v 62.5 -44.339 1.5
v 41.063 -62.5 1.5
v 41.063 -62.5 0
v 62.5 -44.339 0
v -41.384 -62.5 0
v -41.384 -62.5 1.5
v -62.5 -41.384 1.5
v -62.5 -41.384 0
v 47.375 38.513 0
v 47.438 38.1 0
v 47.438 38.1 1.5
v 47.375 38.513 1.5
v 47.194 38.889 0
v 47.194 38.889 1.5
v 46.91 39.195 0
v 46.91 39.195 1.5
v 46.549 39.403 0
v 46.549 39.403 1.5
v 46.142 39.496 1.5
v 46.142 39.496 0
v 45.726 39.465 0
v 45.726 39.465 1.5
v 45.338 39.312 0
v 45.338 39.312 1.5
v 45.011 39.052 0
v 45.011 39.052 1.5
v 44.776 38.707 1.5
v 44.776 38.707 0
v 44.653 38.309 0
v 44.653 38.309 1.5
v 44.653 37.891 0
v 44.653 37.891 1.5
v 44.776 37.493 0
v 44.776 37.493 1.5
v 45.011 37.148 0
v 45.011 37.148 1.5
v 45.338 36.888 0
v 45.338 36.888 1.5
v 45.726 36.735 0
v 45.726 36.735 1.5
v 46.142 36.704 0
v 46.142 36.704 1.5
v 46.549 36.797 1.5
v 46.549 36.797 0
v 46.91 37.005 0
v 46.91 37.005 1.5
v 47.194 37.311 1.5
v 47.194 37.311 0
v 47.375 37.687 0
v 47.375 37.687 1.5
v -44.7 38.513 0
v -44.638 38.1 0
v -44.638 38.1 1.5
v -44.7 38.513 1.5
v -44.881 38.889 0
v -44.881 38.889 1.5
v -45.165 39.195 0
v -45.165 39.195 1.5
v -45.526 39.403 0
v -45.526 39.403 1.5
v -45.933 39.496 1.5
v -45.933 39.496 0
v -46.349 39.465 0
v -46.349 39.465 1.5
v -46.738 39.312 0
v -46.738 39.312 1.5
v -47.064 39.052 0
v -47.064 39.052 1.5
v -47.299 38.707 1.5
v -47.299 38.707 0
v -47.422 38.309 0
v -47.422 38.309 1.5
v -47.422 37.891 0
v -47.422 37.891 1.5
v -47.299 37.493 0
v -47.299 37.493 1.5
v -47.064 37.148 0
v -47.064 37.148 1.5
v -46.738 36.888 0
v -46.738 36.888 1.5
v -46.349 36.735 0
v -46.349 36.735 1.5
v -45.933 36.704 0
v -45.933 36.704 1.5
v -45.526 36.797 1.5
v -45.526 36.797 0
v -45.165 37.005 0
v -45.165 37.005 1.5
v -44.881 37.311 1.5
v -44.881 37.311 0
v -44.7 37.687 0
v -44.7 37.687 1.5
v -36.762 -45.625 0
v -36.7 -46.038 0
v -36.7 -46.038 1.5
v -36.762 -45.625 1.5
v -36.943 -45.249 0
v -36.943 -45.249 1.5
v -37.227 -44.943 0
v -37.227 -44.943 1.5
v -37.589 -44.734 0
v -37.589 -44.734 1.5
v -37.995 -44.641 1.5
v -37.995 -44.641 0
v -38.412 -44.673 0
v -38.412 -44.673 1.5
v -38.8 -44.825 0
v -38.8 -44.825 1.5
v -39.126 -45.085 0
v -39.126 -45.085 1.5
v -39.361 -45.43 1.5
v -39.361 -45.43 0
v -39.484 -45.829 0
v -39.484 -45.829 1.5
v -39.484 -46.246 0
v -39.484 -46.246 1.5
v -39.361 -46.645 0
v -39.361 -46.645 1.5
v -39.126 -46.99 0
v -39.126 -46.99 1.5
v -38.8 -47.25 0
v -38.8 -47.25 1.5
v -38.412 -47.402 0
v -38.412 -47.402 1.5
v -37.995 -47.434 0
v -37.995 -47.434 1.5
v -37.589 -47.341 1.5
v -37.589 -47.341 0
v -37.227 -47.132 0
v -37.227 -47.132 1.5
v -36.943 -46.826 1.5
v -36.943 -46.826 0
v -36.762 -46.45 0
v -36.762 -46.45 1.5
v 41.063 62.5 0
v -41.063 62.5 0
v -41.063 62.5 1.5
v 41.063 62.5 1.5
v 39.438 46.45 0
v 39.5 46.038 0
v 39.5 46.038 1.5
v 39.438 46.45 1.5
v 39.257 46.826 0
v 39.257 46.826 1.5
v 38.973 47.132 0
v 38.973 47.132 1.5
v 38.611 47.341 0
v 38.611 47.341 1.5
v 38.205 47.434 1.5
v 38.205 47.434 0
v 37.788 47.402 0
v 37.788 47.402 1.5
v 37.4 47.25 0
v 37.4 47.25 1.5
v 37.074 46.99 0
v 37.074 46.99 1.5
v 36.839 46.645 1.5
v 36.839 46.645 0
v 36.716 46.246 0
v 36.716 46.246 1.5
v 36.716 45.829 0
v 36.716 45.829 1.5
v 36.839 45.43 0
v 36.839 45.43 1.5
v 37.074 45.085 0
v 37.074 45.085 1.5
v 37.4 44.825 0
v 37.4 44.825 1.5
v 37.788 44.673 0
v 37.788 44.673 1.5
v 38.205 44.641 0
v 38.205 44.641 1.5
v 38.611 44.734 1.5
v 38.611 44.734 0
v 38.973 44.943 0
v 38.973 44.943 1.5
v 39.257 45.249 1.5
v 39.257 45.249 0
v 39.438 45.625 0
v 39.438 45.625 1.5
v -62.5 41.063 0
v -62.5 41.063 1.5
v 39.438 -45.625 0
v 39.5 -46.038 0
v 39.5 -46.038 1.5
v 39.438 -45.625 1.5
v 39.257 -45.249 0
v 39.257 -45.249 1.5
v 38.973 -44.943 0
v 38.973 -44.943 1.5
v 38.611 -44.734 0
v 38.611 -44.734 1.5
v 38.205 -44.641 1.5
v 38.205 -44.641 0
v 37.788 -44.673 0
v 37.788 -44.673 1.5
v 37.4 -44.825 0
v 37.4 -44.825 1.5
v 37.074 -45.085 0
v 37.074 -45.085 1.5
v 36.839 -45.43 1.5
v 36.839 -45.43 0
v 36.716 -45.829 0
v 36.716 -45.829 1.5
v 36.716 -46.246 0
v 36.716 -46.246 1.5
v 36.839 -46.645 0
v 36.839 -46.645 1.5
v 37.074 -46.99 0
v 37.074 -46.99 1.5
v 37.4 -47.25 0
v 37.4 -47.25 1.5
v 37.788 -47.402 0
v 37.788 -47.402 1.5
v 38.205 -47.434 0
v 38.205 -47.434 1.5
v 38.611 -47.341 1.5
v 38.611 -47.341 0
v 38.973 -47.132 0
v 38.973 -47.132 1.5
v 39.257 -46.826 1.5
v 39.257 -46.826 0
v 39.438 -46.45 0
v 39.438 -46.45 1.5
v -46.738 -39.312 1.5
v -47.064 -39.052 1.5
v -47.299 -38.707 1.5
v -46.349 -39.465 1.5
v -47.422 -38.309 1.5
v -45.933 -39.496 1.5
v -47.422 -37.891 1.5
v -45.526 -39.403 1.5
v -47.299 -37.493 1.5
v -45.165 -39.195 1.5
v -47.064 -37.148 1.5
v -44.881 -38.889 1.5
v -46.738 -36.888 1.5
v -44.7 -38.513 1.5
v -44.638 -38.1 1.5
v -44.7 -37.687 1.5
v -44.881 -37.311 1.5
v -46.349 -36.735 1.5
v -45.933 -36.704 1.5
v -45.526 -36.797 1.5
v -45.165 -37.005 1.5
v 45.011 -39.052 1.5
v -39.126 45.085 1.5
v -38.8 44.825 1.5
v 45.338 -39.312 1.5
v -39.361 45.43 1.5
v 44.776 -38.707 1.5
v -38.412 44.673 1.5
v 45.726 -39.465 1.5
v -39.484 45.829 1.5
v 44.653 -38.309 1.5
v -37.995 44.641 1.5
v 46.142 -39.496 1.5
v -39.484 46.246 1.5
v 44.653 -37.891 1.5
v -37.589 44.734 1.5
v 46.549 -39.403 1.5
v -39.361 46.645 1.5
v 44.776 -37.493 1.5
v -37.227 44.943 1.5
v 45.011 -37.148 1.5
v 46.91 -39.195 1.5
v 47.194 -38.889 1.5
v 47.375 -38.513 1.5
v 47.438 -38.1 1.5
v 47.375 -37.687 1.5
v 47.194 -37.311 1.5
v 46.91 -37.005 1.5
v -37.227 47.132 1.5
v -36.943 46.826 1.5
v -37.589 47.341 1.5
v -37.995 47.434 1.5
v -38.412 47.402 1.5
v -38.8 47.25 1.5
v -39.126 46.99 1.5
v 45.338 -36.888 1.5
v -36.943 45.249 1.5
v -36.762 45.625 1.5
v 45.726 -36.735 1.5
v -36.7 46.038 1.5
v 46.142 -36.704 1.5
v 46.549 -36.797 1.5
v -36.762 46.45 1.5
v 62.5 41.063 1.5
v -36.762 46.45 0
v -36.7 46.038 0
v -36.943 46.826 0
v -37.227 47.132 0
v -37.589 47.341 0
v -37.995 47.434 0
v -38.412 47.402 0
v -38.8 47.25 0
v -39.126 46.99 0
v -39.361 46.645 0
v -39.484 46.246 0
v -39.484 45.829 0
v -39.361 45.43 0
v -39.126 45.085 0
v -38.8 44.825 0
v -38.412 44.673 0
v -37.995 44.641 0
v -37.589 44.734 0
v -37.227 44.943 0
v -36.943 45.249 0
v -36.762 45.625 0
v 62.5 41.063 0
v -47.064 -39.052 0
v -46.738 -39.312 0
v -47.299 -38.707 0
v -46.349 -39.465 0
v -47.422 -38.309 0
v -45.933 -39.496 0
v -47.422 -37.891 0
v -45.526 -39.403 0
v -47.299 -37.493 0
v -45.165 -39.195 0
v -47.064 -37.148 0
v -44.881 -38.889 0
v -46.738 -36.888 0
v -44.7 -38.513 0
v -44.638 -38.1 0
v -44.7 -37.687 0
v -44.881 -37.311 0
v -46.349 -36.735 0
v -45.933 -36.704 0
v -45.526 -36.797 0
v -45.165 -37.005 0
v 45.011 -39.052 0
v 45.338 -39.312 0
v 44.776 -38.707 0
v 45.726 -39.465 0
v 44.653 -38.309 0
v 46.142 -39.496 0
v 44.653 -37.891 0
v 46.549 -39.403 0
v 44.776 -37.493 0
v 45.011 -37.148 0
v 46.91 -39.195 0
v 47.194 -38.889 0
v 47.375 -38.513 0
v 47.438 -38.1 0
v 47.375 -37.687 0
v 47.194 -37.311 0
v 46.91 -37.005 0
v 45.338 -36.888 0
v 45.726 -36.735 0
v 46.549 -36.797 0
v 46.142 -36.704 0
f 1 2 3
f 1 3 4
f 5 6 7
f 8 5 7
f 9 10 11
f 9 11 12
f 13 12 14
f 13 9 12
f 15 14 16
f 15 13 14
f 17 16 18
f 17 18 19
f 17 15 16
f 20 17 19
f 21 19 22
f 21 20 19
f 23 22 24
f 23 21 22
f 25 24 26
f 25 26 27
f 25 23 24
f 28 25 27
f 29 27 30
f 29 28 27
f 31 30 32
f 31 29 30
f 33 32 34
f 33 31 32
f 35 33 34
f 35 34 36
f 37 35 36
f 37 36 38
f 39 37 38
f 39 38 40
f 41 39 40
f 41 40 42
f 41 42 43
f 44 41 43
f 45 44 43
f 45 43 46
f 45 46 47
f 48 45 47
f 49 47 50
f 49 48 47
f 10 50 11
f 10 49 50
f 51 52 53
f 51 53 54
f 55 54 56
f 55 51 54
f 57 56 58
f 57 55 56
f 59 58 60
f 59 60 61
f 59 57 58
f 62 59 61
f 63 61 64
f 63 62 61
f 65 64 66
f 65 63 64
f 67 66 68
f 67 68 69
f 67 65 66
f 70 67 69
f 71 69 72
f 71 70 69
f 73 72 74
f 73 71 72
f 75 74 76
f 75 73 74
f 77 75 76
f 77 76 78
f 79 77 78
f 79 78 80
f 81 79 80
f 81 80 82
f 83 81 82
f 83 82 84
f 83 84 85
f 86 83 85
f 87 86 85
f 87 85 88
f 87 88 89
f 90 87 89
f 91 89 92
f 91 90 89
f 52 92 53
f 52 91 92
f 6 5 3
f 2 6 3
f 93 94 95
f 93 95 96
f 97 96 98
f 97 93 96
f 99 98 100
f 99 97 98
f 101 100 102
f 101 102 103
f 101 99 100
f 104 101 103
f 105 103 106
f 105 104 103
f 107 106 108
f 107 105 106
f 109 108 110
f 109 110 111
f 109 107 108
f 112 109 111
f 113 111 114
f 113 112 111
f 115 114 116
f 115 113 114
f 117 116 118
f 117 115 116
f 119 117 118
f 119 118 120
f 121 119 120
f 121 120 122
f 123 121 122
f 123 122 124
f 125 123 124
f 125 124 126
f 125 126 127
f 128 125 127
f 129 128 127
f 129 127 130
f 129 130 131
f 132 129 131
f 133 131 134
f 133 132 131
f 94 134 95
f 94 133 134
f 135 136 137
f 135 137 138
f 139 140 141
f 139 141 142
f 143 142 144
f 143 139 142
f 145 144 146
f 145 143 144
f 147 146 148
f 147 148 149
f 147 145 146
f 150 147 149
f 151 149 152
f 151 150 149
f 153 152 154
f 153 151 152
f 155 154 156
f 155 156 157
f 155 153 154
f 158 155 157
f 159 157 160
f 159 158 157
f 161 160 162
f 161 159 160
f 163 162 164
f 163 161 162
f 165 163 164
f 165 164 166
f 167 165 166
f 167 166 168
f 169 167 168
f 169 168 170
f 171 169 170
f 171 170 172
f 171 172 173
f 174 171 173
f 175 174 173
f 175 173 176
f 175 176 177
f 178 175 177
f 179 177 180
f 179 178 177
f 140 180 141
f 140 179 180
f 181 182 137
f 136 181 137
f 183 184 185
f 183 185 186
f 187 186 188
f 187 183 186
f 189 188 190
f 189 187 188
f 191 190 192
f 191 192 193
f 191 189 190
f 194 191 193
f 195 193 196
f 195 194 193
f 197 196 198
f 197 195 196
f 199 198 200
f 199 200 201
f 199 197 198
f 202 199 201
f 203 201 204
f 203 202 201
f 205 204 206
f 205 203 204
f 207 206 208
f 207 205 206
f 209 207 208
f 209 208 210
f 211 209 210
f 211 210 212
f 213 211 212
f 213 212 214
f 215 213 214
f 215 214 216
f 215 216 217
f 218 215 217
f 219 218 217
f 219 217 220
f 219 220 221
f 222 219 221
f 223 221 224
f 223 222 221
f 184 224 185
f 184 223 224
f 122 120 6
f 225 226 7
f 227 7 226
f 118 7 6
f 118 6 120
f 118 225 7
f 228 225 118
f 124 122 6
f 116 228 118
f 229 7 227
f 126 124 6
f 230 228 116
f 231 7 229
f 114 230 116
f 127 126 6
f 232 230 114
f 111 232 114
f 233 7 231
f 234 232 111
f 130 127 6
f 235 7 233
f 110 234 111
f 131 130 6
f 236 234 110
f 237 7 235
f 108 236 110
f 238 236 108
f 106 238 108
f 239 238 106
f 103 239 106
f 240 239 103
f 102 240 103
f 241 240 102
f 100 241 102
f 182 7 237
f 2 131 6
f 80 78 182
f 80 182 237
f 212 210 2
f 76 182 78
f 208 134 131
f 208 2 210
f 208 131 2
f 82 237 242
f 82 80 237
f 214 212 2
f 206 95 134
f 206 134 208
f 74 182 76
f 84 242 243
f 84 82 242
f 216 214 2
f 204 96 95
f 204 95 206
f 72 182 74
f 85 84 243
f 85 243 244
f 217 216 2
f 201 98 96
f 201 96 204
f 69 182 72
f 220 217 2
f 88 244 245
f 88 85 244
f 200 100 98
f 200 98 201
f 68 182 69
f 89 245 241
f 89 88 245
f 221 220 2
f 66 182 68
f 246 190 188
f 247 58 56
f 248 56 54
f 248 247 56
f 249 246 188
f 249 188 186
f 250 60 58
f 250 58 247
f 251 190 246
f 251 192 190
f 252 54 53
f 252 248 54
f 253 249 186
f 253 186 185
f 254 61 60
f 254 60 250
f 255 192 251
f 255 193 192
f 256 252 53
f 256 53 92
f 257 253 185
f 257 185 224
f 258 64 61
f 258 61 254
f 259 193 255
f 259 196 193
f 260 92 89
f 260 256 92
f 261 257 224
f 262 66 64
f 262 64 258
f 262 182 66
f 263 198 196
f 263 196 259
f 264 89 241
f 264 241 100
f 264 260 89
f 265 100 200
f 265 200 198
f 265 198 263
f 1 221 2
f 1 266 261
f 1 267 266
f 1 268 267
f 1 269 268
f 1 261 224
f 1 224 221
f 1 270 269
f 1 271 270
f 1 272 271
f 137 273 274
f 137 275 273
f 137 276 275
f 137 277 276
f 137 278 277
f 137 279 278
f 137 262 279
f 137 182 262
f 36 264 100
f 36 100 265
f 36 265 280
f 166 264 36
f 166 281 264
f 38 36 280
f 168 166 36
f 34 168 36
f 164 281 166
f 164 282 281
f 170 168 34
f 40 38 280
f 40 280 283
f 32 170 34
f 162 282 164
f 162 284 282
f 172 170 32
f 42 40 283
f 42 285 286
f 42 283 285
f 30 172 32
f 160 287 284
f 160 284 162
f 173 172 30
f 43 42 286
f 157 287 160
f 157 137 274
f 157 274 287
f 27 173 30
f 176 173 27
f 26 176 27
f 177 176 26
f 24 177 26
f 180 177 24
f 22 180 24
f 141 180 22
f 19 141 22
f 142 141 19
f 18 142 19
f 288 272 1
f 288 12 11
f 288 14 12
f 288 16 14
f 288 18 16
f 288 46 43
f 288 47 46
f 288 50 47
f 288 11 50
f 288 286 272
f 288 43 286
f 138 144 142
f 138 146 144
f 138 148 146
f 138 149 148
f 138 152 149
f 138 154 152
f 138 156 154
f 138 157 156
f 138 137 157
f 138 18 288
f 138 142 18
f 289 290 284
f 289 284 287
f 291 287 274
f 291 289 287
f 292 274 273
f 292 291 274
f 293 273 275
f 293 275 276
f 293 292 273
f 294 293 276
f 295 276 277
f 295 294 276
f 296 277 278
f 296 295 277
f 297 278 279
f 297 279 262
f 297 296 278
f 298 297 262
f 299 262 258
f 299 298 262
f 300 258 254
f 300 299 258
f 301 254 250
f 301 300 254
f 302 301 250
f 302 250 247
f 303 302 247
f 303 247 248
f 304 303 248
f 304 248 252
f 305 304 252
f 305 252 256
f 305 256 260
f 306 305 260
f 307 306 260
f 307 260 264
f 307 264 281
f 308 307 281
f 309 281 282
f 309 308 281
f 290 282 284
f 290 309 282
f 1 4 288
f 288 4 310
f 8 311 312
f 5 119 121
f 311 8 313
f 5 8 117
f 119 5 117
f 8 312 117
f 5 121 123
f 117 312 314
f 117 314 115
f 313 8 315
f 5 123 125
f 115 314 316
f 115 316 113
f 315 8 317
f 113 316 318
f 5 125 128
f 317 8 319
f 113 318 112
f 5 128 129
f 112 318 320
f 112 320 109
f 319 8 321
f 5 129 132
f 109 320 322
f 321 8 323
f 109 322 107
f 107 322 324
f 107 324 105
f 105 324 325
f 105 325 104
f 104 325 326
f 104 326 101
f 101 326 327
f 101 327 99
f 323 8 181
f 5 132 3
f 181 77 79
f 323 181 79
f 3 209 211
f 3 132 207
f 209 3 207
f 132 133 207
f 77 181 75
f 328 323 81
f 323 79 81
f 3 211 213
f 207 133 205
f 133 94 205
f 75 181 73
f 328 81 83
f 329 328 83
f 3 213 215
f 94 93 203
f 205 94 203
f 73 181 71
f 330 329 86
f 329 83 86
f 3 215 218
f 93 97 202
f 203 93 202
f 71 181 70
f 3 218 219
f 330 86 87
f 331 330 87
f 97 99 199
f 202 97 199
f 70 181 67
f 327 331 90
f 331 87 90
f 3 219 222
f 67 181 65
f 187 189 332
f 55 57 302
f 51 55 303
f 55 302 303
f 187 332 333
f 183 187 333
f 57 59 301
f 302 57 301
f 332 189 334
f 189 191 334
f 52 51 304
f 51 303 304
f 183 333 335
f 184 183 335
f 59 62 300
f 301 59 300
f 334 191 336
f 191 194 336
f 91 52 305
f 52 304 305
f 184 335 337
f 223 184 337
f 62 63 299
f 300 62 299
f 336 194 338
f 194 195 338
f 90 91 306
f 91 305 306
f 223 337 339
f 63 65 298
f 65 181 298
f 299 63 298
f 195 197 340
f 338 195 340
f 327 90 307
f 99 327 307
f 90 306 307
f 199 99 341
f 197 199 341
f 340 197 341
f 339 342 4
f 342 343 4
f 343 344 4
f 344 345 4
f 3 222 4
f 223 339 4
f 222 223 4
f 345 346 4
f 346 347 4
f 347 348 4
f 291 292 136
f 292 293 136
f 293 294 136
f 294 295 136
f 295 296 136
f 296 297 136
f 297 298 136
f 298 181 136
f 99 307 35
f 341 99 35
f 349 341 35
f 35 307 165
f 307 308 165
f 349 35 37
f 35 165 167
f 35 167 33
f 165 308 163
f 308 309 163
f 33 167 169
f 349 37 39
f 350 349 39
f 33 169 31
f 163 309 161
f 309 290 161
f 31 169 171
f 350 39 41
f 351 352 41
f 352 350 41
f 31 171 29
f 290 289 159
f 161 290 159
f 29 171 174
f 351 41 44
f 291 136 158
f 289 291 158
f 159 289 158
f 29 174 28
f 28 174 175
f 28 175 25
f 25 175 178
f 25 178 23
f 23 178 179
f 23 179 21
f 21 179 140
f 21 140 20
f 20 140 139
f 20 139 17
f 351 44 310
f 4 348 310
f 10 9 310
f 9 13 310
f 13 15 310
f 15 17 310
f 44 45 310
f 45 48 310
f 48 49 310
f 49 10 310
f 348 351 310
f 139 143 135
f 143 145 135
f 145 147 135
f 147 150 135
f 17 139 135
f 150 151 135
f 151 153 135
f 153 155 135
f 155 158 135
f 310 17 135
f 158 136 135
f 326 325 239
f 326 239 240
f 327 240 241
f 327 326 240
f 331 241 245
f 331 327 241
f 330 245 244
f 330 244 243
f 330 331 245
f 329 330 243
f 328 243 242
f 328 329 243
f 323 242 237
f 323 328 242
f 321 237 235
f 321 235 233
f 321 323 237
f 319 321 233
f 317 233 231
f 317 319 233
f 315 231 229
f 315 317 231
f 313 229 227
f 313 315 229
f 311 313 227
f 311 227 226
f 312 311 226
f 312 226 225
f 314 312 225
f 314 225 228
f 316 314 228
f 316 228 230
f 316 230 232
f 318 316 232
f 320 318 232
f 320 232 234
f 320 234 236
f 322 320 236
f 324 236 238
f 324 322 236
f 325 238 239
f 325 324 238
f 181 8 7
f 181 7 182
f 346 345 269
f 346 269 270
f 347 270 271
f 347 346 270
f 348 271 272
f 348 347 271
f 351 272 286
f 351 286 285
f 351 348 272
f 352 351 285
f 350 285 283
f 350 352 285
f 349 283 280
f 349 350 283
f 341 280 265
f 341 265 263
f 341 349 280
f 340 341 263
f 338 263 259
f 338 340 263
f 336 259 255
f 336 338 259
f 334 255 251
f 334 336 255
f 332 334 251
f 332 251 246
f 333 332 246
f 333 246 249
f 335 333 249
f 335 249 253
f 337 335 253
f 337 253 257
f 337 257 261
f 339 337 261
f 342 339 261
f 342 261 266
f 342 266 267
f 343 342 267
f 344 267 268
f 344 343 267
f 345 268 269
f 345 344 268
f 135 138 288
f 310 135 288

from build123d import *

# Parameters (mm, degrees)
SKETCH1_W      = 125
SKETCH1_H      = 125
SKETCH1_R      = 1.4
EXTRUDE1_DEPTH = 1.5
EXTRUDE2_DEPTH = 10


with BuildPart() as part:
    # Sketch1 → Extrude1 (new body)
    with BuildSketch(Plane.XY):
        Rectangle(SKETCH1_W, SKETCH1_H)
        with Locations((46.0375, 38.1)):
            Circle(SKETCH1_R, mode=Mode.SUBTRACT)
        with Locations((38.1, 46.0375)):
            Circle(SKETCH1_R, mode=Mode.SUBTRACT)
        with Locations((-38.1, 46.0375)):
            Circle(SKETCH1_R, mode=Mode.SUBTRACT)
        with Locations((-46.0375, 38.1)):
            Circle(SKETCH1_R, mode=Mode.SUBTRACT)
        with Locations((-46.0375, -38.1)):
            Circle(SKETCH1_R, mode=Mode.SUBTRACT)
        with Locations((-38.1, -46.0375)):
            Circle(SKETCH1_R, mode=Mode.SUBTRACT)
        with Locations((38.1, -46.0375)):
            Circle(SKETCH1_R, mode=Mode.SUBTRACT)
        with Locations((46.0375, -38.1)):
            Circle(SKETCH1_R, mode=Mode.SUBTRACT)
    extrude(amount=EXTRUDE1_DEPTH)

    # Sketch2 → Extrude2 (cut)
    with BuildSketch(Plane.XY.offset(1.5)):
        Polygon((41.063122539, -62.5), (62.5, -44.338577872), (62.5, -62.5), align=None)
        Polygon((41.063122539, 62.5), (62.5, 41.063122539), (62.5, 62.5), align=None)
        Polygon((-41.384179801, -62.5), (-62.5, -41.384179801), (-62.5, -62.5), align=None)
        Polygon((-62.5, 41.063122539), (-41.063122539, 62.5), (-62.5, 62.5), align=None)
    extrude(amount=-EXTRUDE2_DEPTH, mode=Mode.SUBTRACT)


solid = part.part
